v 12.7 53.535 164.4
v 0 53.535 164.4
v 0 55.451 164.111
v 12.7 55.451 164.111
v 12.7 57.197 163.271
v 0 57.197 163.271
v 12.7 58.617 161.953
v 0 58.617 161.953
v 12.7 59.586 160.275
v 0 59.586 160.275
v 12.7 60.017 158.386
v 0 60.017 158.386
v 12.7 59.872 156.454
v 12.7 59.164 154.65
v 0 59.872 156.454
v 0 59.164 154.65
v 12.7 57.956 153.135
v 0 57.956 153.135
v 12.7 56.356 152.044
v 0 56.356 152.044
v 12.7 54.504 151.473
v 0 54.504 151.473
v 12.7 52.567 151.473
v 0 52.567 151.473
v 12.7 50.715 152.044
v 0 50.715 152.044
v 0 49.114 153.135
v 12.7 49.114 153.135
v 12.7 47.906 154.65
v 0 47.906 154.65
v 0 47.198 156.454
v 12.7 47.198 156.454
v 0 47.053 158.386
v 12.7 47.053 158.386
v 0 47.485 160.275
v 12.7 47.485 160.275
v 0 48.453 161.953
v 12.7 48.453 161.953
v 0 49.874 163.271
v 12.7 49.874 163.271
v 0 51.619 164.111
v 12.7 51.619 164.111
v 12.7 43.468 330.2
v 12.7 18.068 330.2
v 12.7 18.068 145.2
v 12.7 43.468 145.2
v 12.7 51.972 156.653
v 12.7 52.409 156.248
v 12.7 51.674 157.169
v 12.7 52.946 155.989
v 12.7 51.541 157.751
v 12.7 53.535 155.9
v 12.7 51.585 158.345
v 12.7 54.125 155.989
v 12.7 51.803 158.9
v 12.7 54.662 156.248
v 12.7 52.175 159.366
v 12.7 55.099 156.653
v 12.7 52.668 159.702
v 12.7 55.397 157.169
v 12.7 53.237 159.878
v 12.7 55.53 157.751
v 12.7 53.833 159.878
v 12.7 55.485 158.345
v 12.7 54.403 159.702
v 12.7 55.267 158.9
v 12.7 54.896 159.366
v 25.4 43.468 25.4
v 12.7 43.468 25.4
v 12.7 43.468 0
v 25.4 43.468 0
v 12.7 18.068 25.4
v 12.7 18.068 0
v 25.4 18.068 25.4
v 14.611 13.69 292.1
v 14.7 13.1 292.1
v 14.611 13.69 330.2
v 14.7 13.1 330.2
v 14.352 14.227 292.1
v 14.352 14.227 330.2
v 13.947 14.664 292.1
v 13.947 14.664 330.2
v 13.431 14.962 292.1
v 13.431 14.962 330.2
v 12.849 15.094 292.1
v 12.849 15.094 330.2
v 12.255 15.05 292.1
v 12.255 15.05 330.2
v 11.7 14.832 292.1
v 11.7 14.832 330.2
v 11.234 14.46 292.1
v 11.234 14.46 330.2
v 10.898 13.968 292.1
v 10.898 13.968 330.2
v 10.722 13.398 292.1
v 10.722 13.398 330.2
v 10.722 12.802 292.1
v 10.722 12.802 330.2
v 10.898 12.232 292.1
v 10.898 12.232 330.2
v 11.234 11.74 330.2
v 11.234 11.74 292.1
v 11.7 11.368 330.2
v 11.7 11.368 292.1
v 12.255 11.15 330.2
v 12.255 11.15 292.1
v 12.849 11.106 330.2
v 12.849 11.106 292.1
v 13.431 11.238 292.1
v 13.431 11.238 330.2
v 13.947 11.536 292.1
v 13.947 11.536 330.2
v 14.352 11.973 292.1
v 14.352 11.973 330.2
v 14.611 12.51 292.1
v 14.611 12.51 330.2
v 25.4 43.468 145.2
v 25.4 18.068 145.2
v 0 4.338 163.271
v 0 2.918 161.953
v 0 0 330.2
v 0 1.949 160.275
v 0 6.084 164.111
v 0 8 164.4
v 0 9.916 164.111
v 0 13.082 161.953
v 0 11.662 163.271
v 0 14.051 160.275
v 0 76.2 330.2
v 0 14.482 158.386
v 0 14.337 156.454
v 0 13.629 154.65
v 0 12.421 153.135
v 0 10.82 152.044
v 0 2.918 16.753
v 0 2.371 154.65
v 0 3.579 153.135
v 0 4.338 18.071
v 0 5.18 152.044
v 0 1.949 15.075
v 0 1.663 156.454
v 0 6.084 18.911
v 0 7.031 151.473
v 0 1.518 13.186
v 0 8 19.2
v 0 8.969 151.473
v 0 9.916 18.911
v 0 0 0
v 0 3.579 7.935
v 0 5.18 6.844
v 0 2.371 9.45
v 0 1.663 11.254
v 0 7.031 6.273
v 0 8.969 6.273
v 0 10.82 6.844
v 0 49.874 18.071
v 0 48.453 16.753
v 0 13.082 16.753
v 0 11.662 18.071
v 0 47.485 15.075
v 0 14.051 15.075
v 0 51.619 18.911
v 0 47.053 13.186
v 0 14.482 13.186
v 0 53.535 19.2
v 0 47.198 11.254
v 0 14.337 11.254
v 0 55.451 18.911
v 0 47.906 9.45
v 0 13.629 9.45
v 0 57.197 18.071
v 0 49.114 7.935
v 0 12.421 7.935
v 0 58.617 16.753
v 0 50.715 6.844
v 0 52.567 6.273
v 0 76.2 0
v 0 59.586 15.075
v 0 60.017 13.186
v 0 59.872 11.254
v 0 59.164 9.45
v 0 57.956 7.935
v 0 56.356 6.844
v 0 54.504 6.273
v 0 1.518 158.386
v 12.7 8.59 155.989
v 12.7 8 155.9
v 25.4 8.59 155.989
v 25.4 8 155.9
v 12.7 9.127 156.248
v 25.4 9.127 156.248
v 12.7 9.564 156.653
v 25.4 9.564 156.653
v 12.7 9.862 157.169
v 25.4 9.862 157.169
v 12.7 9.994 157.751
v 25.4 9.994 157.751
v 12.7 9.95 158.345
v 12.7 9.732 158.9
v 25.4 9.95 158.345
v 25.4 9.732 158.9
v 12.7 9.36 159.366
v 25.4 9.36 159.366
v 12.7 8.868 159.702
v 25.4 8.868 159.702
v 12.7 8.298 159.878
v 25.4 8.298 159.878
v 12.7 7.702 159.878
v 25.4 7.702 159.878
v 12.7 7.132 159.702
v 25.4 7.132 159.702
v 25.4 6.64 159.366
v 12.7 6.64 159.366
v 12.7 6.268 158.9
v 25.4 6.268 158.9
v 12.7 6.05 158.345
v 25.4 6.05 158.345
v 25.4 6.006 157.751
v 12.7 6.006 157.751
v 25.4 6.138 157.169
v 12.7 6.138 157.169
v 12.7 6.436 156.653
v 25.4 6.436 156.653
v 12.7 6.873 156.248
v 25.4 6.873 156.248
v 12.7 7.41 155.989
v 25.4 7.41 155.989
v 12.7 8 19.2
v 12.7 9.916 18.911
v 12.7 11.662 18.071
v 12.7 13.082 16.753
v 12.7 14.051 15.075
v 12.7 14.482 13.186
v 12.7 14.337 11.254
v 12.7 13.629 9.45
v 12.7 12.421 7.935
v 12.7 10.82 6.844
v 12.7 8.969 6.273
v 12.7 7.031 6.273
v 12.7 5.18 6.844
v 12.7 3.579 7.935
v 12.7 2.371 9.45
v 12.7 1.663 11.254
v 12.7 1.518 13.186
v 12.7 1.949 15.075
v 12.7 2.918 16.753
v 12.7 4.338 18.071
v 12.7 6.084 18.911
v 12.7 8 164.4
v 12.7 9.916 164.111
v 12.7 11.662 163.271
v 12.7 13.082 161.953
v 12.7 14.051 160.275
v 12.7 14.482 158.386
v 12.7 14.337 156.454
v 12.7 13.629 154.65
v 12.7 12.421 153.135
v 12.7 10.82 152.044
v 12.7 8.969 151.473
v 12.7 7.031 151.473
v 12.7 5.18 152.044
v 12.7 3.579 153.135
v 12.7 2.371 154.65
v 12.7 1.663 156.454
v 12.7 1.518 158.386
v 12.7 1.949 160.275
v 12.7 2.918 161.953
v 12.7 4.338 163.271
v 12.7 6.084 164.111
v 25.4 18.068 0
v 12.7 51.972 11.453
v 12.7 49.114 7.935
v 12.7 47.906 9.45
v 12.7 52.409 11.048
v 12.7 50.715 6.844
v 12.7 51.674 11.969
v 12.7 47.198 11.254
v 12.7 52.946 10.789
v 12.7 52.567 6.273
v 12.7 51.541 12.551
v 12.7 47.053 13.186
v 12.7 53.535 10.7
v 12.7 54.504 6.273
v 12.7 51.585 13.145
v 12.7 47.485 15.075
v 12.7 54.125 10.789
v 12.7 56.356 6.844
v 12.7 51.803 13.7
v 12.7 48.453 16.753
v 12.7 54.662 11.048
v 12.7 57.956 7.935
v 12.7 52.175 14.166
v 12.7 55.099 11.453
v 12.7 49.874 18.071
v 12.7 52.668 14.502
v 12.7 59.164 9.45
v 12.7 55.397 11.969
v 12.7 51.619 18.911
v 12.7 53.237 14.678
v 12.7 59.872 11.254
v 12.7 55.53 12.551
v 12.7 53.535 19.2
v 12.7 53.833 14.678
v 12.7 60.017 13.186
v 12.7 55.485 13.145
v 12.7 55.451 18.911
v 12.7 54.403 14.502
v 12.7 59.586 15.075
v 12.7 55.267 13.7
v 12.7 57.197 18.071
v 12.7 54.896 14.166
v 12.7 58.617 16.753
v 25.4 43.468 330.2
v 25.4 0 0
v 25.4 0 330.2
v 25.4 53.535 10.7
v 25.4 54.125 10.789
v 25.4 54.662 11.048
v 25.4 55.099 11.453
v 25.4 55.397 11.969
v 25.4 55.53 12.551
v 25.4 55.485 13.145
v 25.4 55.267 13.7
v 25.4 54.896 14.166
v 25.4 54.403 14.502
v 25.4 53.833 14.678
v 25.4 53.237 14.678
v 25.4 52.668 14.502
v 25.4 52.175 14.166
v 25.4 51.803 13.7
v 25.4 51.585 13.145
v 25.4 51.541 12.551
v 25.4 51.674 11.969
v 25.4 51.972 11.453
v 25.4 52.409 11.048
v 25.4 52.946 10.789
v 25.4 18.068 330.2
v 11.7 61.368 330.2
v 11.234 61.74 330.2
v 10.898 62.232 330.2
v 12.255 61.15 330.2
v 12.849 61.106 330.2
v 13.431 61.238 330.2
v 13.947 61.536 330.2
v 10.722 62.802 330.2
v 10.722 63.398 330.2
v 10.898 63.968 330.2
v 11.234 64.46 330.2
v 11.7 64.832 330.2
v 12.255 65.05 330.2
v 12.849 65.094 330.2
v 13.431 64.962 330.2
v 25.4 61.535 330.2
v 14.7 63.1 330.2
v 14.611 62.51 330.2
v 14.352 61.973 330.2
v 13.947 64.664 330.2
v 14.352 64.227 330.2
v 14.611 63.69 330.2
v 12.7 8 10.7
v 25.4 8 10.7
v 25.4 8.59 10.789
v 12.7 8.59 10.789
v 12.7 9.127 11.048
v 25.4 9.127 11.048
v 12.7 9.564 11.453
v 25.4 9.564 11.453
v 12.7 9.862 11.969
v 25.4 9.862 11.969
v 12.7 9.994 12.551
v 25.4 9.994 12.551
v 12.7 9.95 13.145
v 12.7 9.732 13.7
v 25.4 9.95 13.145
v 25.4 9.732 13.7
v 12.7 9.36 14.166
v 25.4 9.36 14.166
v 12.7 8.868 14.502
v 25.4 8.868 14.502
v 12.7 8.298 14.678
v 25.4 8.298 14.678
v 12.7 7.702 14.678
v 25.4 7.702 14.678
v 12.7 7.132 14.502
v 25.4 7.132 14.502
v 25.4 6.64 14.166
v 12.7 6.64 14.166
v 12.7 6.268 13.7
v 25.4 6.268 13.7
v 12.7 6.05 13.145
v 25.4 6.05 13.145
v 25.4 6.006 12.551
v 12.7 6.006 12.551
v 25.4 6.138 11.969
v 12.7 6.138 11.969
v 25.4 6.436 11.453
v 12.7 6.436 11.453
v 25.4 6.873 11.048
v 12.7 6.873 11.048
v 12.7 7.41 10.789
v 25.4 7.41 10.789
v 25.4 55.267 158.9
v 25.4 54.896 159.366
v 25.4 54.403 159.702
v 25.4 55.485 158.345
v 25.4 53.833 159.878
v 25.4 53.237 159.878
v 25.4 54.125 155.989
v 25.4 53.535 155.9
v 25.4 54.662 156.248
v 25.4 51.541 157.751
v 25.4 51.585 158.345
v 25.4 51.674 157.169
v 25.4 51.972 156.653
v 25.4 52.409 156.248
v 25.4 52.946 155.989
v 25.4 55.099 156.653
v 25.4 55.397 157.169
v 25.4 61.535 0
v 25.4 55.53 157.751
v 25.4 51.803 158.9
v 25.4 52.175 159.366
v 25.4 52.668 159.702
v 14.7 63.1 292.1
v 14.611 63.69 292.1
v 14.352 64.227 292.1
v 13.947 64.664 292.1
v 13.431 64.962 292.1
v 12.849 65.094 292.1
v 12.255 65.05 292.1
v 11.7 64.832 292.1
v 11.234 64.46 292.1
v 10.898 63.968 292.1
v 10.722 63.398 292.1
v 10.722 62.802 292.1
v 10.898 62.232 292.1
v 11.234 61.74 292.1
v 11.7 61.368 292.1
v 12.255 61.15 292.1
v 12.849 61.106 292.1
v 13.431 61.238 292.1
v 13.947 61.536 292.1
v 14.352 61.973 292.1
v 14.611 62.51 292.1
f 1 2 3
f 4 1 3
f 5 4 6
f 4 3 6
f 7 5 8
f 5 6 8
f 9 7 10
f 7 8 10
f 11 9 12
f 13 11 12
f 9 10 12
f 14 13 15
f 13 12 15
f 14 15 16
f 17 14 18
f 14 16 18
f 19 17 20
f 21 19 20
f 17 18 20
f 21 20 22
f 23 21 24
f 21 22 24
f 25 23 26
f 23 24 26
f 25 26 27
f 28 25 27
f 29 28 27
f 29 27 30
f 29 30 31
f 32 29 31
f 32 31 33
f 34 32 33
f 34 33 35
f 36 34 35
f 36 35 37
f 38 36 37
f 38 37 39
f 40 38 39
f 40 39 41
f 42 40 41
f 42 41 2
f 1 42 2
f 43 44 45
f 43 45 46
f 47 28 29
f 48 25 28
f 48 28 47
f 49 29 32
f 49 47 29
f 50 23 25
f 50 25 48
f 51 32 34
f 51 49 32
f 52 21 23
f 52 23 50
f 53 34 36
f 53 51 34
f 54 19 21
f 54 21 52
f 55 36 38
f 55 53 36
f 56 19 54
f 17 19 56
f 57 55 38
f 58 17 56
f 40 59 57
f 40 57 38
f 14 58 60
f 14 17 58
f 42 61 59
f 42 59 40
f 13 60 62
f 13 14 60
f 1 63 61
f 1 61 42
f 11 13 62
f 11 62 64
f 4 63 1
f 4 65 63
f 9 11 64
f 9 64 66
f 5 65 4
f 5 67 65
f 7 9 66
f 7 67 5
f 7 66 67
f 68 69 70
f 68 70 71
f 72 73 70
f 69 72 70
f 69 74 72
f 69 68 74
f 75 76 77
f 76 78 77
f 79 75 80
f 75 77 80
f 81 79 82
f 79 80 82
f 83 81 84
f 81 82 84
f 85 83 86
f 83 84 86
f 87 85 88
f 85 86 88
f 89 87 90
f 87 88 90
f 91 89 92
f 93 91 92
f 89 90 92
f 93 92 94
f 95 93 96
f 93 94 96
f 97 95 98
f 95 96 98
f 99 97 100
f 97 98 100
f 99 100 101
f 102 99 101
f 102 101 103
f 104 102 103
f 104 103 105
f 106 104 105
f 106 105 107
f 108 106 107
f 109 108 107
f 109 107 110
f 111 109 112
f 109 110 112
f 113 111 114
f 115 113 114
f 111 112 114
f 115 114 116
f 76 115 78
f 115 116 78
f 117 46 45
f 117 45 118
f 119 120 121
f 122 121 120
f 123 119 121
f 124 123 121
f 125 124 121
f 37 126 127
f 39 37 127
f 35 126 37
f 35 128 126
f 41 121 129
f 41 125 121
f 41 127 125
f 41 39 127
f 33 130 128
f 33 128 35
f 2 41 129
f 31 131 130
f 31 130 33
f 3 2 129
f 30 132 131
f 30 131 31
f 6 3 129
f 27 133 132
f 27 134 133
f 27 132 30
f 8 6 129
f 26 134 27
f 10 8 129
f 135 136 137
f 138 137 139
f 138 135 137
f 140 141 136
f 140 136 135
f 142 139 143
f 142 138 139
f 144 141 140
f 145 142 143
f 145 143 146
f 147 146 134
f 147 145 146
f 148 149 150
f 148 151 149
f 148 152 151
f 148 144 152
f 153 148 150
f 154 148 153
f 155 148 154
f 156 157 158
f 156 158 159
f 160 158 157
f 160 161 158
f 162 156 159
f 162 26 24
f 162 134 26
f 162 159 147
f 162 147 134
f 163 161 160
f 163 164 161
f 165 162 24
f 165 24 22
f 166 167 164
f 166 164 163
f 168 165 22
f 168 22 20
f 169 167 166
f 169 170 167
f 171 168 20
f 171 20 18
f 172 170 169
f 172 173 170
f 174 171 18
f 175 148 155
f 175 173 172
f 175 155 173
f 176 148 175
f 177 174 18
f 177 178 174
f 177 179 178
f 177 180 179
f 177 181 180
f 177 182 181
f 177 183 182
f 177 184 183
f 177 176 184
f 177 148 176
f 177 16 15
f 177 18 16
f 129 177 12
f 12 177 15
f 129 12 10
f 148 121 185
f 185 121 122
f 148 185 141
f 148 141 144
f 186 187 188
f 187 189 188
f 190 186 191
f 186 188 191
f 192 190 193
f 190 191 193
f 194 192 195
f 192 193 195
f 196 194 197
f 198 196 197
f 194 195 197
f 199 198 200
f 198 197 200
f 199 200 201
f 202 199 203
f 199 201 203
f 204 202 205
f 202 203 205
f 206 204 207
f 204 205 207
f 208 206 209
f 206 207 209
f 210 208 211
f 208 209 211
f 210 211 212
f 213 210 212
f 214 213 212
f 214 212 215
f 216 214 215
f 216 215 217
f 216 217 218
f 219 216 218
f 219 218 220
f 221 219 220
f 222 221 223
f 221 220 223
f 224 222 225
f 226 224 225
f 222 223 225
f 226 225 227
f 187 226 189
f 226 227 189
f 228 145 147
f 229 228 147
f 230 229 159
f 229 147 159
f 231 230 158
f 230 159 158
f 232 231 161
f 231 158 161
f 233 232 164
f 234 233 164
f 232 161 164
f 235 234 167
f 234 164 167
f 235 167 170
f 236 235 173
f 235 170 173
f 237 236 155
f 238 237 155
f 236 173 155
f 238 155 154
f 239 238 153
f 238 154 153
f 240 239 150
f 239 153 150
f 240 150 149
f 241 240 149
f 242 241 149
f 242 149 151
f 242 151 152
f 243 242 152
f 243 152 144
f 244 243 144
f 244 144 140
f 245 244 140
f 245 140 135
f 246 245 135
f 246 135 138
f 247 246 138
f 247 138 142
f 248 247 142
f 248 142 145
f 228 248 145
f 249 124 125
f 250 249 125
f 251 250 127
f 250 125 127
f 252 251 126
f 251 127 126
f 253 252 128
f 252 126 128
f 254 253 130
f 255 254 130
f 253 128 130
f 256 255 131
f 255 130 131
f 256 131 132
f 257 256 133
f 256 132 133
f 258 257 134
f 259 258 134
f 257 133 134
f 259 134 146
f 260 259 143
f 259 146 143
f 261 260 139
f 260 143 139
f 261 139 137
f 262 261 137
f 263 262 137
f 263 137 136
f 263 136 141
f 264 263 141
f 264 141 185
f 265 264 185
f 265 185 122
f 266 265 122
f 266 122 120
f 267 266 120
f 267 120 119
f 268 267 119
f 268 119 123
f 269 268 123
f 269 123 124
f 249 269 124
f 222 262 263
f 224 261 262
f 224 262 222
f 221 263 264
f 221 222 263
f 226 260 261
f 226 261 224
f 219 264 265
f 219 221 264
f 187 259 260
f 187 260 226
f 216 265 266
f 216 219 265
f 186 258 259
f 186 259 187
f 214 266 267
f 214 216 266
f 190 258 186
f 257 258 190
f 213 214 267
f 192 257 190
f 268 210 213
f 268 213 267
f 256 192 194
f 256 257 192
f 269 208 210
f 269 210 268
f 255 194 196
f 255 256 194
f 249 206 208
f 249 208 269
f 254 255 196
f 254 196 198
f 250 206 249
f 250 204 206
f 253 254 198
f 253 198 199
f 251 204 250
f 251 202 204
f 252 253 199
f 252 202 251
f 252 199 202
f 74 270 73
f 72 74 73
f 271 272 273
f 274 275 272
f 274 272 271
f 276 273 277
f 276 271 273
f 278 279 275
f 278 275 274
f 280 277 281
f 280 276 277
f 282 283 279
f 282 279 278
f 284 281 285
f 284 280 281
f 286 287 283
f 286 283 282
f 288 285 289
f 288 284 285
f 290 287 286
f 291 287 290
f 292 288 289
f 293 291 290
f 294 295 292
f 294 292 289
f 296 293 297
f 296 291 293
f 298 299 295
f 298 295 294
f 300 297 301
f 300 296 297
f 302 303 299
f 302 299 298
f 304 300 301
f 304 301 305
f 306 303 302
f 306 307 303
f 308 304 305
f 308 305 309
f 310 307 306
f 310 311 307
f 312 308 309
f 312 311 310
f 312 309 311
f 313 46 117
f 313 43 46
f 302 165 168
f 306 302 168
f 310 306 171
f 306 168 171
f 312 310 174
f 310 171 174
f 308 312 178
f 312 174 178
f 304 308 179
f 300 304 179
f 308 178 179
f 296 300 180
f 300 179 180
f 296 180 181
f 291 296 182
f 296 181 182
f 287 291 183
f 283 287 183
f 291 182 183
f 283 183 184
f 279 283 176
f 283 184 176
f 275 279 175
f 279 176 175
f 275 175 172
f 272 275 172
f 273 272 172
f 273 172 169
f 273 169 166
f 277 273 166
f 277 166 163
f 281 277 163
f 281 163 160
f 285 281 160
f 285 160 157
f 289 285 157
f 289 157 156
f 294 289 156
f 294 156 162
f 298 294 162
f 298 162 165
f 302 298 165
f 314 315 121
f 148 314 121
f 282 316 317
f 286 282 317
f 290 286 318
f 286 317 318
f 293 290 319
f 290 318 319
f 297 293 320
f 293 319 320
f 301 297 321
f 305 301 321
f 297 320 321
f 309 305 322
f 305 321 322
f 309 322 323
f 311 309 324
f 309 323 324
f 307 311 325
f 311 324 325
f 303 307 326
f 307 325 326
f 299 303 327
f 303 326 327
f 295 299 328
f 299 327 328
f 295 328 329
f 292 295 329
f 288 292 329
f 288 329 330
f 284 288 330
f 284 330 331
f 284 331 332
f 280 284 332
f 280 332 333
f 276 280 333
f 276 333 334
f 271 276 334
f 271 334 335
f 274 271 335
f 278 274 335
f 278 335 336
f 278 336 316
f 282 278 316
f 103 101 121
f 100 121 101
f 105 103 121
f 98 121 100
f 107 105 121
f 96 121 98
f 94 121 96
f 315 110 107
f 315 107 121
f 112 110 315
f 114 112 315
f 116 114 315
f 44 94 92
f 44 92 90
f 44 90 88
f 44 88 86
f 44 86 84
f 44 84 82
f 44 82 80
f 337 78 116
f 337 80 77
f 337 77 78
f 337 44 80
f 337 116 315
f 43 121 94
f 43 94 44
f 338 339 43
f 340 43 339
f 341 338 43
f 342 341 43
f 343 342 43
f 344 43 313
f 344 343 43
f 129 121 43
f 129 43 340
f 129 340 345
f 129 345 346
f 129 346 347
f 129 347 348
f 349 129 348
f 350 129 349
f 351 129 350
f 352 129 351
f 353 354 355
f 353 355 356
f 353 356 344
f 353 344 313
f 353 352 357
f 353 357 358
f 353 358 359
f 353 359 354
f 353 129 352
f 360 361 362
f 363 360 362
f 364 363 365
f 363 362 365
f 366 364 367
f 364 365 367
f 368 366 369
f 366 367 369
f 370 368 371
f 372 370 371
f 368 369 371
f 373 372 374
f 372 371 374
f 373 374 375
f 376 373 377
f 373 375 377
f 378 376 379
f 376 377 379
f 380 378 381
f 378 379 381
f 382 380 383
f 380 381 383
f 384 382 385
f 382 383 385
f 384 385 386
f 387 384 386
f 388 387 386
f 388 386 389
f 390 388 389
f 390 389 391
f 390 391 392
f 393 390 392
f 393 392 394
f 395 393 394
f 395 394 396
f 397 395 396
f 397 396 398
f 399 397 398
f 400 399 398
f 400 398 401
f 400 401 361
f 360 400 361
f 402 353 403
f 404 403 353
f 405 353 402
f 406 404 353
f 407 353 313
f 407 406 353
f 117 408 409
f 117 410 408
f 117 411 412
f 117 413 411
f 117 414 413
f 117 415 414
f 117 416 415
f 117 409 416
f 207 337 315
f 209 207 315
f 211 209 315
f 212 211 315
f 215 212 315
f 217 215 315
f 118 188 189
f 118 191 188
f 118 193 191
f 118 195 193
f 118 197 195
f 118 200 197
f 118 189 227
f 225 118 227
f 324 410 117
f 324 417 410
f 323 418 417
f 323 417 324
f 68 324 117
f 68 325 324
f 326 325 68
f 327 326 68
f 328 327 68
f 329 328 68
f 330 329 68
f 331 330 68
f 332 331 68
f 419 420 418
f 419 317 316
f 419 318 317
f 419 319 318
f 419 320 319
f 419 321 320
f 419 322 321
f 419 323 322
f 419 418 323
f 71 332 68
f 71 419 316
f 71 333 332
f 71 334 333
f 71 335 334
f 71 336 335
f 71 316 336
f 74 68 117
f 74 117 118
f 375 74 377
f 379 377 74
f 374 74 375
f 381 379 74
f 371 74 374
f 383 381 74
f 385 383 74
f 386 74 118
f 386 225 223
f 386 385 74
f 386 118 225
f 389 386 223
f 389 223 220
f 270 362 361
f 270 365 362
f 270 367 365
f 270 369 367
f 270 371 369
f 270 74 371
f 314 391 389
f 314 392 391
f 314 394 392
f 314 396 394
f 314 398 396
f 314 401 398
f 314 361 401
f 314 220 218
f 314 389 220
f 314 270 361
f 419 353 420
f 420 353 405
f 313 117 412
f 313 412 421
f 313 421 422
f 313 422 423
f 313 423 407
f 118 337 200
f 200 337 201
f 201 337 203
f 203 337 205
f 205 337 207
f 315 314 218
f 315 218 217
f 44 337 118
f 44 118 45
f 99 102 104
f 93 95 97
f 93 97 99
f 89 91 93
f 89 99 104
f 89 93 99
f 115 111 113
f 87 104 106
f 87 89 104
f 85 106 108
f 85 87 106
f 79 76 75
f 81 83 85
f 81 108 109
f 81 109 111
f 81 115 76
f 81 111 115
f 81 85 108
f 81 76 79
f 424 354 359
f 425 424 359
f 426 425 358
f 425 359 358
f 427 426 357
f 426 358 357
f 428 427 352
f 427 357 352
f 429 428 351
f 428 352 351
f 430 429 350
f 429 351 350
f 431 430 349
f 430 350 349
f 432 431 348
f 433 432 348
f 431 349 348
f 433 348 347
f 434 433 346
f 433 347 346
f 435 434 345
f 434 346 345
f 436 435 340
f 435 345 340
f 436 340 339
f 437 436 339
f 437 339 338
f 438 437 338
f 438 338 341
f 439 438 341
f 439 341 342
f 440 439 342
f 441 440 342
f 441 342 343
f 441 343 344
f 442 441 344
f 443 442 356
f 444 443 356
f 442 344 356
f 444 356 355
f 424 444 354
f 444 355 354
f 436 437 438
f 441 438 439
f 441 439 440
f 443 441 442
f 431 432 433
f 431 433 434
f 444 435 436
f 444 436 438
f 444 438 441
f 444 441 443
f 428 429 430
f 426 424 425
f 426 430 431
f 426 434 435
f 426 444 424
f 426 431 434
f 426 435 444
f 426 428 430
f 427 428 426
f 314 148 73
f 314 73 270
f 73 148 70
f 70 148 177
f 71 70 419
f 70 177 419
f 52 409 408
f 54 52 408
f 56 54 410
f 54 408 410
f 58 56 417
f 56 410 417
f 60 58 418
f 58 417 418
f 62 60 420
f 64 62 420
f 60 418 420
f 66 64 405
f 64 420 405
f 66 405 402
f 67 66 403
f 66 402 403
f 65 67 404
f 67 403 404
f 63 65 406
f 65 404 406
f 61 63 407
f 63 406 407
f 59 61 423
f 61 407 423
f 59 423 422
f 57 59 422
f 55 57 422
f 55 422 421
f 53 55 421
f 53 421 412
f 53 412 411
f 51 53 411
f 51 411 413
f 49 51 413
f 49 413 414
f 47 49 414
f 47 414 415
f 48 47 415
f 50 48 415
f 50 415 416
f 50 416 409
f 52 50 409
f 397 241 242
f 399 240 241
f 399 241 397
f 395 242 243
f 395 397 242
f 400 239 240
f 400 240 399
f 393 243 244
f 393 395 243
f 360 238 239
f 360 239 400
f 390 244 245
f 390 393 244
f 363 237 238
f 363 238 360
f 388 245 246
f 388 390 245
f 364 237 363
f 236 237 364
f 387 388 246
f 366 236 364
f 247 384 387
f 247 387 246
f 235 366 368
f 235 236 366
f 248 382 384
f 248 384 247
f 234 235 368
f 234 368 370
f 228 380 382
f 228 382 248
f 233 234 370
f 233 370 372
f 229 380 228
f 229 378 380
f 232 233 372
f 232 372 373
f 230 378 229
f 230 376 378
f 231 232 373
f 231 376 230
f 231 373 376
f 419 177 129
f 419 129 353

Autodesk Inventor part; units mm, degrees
ref_plane "YZ Plane" through (0, 0, 0) normal (1, 0, 0) x (0, 1, 0)
ref_plane "XZ Plane" through (0, 0, 0) normal (0, 1, 0) x (-1, 0, 0)
ref_plane "XY Plane" through (0, 0, 0) normal (0, 0, 1) x (1, 0, 0)
sketch "Sketch1" plane through (0, 0, 0) normal (0, 0, 1) x (1, 0, 0)
  line L0 (0, 0) -> (0, 76.2)
  line L1 (0, 76.2) -> (25.4, 61.5353)
  line L2 (25.4, 61.5353) -> (25.4, 0)
  line L3 (25.4, 0) -> (0, 0)
  dimension "d0" = 25.4
  dimension "d1" = 76.2
  dimension "d2" = 60
extrude "Extrusion1" add sketch "Sketch1" along normal blind 330.2
sketch "Sketch3" plane through (0, 0, 330.2) normal (0, 0, 1) x (1, 0, 0)
  line L0 (12.7, 43.4677) -> (25.4, 43.4677)
  line L1 (25.4, 43.4677) -> (25.4, 18.0677)
  line L2 (25.4, 18.0677) -> (12.7, 18.0677)
  line L3 (12.7, 18.0677) -> (12.7, 43.4677)
  line L4 (25.4, 0) -> (25.4, 61.5353) projected
  point P0 (0, 0)
  point P1 (25.4, 30.7677)
  dimension "d5" = 12.7
  dimension "d6" = 25.4
extrude "Extrusion2" cut sketch "Sketch3" against normal blind 185
sketch "Sketch4" plane through (0, 0, 0) normal (0, 0, -1) x (-1, 0, 0)
  line L0 (-12.7, 18.0677) -> (-12.7, 43.4677) projected
  line L1 (-12.7, 18.0677) -> (-12.7, 43.4677) projected
  line L2 (-25.4, 18.0677) -> (-12.7, 18.0677) projected
  line L3 (-25.4, 43.4677) -> (-25.4, 18.0677) projected
  line L4 (-12.7, 43.4677) -> (-25.4, 43.4677) projected
  point P0 (0, 0)
extrude "Extrusion3" cut sketch "Sketch4" against normal blind 25.4
sketch "Sketch5" plane through (25.4, 61.5353, 330.2) normal (1, 0, 0) x (0, 0, -1)
  line L0 (172.3, -53.5353) -> (317.5, -53.5353) construction
  line L1 (317.5, -53.5353) -> (317.5, -8) construction
  line L2 (317.5, -8) -> (172.3, -8) construction
  line L3 (172.3, -8) -> (172.3, -53.5353) construction
  line L4 (304.8, -18.0677) -> (304.8, -43.4677) construction
  line L5 (185, -18.0677) -> (185, -43.4677) construction
  line L6 (330.2, -61.5353) -> (0, -61.5353) projected
  circle A0 centre (172.3, -53.5353) radius 2
  circle A1 centre (172.3, -8) radius 2
  circle A2 centre (317.5, -8) radius 2
  circle A3 centre (317.5, -53.5353) radius 2
  point P0 (185, -30.7677)
  point P1 (172.3, -30.7677)
  point P2 (304.8, -30.7677)
  point P3 (317.5, -30.7677)
  dimension "d11" = 12.7
  dimension "d12" = 12.7
  dimension "d13" = 8
  dimension "d14" = 4
  dimension "d15" = 4
  dimension "d16" = 4
  dimension "d17" = 4
extrude "Extrusion4" cut sketch "Sketch5" against normal through all
sketch "Sketch6" plane through (0, 0, 0) normal (-1, 0, 0) x (0, 0, 1)
  circle A0 centre (157.9, 53.5353) radius 2 projected
  circle A1 centre (157.9, 8) radius 2 projected
  circle A2 centre (12.7, 8) radius 2 projected
  circle A3 centre (12.7, 53.5353) radius 2 projected
  circle A4 centre (157.9, 53.5353) radius 2 projected
  circle A5 centre (157.9, 53.5353) radius 6.5
  circle A6 centre (157.9, 8) radius 2 projected
  circle A7 centre (157.9, 8) radius 6.5
  circle A8 centre (12.7, 8) radius 2 projected
  circle A9 centre (12.7, 8) radius 6.5
  circle A10 centre (12.7, 53.5353) radius 2 projected
  circle A11 centre (12.7, 53.5353) radius 6.5
  point P0 (0, 0)
  dimension "d20" = 13
  dimension "d21" = 13
  dimension "d22" = 13
  dimension "d23" = 13
extrude "Extrusion5" cut sketch "Sketch6" against normal blind 12.7 contours A0 | A1 | A2 | A3 | A5 | A7 | A9 | A11
sketch "Sketch7" plane through (0, 0, 330.2) normal (0, 0, 1) x (1, 0, 0)
  circle A0 centre (12.7, 63.1) radius 2
  circle A1 centre (12.7, 13.1) radius 2
  line L0 (12.7, 63.1) -> (12.7, 13.1)
  line L1 (0, 76.2) -> (0, 0) projected
  line L2 (0, 0) -> (25.4, 0) projected
  point P0 (12.7, 38.1)
  point P1 (0, 38.1)
  point P2 (12.7, 0)
  dimension "d26" = 4
  dimension "d27" = 4
  dimension "d28" = 50
extrude "Extrusion6" cut sketch "Sketch7" against normal blind 38.1
properties part number "HB01" material "Polyethylene, High Density"
